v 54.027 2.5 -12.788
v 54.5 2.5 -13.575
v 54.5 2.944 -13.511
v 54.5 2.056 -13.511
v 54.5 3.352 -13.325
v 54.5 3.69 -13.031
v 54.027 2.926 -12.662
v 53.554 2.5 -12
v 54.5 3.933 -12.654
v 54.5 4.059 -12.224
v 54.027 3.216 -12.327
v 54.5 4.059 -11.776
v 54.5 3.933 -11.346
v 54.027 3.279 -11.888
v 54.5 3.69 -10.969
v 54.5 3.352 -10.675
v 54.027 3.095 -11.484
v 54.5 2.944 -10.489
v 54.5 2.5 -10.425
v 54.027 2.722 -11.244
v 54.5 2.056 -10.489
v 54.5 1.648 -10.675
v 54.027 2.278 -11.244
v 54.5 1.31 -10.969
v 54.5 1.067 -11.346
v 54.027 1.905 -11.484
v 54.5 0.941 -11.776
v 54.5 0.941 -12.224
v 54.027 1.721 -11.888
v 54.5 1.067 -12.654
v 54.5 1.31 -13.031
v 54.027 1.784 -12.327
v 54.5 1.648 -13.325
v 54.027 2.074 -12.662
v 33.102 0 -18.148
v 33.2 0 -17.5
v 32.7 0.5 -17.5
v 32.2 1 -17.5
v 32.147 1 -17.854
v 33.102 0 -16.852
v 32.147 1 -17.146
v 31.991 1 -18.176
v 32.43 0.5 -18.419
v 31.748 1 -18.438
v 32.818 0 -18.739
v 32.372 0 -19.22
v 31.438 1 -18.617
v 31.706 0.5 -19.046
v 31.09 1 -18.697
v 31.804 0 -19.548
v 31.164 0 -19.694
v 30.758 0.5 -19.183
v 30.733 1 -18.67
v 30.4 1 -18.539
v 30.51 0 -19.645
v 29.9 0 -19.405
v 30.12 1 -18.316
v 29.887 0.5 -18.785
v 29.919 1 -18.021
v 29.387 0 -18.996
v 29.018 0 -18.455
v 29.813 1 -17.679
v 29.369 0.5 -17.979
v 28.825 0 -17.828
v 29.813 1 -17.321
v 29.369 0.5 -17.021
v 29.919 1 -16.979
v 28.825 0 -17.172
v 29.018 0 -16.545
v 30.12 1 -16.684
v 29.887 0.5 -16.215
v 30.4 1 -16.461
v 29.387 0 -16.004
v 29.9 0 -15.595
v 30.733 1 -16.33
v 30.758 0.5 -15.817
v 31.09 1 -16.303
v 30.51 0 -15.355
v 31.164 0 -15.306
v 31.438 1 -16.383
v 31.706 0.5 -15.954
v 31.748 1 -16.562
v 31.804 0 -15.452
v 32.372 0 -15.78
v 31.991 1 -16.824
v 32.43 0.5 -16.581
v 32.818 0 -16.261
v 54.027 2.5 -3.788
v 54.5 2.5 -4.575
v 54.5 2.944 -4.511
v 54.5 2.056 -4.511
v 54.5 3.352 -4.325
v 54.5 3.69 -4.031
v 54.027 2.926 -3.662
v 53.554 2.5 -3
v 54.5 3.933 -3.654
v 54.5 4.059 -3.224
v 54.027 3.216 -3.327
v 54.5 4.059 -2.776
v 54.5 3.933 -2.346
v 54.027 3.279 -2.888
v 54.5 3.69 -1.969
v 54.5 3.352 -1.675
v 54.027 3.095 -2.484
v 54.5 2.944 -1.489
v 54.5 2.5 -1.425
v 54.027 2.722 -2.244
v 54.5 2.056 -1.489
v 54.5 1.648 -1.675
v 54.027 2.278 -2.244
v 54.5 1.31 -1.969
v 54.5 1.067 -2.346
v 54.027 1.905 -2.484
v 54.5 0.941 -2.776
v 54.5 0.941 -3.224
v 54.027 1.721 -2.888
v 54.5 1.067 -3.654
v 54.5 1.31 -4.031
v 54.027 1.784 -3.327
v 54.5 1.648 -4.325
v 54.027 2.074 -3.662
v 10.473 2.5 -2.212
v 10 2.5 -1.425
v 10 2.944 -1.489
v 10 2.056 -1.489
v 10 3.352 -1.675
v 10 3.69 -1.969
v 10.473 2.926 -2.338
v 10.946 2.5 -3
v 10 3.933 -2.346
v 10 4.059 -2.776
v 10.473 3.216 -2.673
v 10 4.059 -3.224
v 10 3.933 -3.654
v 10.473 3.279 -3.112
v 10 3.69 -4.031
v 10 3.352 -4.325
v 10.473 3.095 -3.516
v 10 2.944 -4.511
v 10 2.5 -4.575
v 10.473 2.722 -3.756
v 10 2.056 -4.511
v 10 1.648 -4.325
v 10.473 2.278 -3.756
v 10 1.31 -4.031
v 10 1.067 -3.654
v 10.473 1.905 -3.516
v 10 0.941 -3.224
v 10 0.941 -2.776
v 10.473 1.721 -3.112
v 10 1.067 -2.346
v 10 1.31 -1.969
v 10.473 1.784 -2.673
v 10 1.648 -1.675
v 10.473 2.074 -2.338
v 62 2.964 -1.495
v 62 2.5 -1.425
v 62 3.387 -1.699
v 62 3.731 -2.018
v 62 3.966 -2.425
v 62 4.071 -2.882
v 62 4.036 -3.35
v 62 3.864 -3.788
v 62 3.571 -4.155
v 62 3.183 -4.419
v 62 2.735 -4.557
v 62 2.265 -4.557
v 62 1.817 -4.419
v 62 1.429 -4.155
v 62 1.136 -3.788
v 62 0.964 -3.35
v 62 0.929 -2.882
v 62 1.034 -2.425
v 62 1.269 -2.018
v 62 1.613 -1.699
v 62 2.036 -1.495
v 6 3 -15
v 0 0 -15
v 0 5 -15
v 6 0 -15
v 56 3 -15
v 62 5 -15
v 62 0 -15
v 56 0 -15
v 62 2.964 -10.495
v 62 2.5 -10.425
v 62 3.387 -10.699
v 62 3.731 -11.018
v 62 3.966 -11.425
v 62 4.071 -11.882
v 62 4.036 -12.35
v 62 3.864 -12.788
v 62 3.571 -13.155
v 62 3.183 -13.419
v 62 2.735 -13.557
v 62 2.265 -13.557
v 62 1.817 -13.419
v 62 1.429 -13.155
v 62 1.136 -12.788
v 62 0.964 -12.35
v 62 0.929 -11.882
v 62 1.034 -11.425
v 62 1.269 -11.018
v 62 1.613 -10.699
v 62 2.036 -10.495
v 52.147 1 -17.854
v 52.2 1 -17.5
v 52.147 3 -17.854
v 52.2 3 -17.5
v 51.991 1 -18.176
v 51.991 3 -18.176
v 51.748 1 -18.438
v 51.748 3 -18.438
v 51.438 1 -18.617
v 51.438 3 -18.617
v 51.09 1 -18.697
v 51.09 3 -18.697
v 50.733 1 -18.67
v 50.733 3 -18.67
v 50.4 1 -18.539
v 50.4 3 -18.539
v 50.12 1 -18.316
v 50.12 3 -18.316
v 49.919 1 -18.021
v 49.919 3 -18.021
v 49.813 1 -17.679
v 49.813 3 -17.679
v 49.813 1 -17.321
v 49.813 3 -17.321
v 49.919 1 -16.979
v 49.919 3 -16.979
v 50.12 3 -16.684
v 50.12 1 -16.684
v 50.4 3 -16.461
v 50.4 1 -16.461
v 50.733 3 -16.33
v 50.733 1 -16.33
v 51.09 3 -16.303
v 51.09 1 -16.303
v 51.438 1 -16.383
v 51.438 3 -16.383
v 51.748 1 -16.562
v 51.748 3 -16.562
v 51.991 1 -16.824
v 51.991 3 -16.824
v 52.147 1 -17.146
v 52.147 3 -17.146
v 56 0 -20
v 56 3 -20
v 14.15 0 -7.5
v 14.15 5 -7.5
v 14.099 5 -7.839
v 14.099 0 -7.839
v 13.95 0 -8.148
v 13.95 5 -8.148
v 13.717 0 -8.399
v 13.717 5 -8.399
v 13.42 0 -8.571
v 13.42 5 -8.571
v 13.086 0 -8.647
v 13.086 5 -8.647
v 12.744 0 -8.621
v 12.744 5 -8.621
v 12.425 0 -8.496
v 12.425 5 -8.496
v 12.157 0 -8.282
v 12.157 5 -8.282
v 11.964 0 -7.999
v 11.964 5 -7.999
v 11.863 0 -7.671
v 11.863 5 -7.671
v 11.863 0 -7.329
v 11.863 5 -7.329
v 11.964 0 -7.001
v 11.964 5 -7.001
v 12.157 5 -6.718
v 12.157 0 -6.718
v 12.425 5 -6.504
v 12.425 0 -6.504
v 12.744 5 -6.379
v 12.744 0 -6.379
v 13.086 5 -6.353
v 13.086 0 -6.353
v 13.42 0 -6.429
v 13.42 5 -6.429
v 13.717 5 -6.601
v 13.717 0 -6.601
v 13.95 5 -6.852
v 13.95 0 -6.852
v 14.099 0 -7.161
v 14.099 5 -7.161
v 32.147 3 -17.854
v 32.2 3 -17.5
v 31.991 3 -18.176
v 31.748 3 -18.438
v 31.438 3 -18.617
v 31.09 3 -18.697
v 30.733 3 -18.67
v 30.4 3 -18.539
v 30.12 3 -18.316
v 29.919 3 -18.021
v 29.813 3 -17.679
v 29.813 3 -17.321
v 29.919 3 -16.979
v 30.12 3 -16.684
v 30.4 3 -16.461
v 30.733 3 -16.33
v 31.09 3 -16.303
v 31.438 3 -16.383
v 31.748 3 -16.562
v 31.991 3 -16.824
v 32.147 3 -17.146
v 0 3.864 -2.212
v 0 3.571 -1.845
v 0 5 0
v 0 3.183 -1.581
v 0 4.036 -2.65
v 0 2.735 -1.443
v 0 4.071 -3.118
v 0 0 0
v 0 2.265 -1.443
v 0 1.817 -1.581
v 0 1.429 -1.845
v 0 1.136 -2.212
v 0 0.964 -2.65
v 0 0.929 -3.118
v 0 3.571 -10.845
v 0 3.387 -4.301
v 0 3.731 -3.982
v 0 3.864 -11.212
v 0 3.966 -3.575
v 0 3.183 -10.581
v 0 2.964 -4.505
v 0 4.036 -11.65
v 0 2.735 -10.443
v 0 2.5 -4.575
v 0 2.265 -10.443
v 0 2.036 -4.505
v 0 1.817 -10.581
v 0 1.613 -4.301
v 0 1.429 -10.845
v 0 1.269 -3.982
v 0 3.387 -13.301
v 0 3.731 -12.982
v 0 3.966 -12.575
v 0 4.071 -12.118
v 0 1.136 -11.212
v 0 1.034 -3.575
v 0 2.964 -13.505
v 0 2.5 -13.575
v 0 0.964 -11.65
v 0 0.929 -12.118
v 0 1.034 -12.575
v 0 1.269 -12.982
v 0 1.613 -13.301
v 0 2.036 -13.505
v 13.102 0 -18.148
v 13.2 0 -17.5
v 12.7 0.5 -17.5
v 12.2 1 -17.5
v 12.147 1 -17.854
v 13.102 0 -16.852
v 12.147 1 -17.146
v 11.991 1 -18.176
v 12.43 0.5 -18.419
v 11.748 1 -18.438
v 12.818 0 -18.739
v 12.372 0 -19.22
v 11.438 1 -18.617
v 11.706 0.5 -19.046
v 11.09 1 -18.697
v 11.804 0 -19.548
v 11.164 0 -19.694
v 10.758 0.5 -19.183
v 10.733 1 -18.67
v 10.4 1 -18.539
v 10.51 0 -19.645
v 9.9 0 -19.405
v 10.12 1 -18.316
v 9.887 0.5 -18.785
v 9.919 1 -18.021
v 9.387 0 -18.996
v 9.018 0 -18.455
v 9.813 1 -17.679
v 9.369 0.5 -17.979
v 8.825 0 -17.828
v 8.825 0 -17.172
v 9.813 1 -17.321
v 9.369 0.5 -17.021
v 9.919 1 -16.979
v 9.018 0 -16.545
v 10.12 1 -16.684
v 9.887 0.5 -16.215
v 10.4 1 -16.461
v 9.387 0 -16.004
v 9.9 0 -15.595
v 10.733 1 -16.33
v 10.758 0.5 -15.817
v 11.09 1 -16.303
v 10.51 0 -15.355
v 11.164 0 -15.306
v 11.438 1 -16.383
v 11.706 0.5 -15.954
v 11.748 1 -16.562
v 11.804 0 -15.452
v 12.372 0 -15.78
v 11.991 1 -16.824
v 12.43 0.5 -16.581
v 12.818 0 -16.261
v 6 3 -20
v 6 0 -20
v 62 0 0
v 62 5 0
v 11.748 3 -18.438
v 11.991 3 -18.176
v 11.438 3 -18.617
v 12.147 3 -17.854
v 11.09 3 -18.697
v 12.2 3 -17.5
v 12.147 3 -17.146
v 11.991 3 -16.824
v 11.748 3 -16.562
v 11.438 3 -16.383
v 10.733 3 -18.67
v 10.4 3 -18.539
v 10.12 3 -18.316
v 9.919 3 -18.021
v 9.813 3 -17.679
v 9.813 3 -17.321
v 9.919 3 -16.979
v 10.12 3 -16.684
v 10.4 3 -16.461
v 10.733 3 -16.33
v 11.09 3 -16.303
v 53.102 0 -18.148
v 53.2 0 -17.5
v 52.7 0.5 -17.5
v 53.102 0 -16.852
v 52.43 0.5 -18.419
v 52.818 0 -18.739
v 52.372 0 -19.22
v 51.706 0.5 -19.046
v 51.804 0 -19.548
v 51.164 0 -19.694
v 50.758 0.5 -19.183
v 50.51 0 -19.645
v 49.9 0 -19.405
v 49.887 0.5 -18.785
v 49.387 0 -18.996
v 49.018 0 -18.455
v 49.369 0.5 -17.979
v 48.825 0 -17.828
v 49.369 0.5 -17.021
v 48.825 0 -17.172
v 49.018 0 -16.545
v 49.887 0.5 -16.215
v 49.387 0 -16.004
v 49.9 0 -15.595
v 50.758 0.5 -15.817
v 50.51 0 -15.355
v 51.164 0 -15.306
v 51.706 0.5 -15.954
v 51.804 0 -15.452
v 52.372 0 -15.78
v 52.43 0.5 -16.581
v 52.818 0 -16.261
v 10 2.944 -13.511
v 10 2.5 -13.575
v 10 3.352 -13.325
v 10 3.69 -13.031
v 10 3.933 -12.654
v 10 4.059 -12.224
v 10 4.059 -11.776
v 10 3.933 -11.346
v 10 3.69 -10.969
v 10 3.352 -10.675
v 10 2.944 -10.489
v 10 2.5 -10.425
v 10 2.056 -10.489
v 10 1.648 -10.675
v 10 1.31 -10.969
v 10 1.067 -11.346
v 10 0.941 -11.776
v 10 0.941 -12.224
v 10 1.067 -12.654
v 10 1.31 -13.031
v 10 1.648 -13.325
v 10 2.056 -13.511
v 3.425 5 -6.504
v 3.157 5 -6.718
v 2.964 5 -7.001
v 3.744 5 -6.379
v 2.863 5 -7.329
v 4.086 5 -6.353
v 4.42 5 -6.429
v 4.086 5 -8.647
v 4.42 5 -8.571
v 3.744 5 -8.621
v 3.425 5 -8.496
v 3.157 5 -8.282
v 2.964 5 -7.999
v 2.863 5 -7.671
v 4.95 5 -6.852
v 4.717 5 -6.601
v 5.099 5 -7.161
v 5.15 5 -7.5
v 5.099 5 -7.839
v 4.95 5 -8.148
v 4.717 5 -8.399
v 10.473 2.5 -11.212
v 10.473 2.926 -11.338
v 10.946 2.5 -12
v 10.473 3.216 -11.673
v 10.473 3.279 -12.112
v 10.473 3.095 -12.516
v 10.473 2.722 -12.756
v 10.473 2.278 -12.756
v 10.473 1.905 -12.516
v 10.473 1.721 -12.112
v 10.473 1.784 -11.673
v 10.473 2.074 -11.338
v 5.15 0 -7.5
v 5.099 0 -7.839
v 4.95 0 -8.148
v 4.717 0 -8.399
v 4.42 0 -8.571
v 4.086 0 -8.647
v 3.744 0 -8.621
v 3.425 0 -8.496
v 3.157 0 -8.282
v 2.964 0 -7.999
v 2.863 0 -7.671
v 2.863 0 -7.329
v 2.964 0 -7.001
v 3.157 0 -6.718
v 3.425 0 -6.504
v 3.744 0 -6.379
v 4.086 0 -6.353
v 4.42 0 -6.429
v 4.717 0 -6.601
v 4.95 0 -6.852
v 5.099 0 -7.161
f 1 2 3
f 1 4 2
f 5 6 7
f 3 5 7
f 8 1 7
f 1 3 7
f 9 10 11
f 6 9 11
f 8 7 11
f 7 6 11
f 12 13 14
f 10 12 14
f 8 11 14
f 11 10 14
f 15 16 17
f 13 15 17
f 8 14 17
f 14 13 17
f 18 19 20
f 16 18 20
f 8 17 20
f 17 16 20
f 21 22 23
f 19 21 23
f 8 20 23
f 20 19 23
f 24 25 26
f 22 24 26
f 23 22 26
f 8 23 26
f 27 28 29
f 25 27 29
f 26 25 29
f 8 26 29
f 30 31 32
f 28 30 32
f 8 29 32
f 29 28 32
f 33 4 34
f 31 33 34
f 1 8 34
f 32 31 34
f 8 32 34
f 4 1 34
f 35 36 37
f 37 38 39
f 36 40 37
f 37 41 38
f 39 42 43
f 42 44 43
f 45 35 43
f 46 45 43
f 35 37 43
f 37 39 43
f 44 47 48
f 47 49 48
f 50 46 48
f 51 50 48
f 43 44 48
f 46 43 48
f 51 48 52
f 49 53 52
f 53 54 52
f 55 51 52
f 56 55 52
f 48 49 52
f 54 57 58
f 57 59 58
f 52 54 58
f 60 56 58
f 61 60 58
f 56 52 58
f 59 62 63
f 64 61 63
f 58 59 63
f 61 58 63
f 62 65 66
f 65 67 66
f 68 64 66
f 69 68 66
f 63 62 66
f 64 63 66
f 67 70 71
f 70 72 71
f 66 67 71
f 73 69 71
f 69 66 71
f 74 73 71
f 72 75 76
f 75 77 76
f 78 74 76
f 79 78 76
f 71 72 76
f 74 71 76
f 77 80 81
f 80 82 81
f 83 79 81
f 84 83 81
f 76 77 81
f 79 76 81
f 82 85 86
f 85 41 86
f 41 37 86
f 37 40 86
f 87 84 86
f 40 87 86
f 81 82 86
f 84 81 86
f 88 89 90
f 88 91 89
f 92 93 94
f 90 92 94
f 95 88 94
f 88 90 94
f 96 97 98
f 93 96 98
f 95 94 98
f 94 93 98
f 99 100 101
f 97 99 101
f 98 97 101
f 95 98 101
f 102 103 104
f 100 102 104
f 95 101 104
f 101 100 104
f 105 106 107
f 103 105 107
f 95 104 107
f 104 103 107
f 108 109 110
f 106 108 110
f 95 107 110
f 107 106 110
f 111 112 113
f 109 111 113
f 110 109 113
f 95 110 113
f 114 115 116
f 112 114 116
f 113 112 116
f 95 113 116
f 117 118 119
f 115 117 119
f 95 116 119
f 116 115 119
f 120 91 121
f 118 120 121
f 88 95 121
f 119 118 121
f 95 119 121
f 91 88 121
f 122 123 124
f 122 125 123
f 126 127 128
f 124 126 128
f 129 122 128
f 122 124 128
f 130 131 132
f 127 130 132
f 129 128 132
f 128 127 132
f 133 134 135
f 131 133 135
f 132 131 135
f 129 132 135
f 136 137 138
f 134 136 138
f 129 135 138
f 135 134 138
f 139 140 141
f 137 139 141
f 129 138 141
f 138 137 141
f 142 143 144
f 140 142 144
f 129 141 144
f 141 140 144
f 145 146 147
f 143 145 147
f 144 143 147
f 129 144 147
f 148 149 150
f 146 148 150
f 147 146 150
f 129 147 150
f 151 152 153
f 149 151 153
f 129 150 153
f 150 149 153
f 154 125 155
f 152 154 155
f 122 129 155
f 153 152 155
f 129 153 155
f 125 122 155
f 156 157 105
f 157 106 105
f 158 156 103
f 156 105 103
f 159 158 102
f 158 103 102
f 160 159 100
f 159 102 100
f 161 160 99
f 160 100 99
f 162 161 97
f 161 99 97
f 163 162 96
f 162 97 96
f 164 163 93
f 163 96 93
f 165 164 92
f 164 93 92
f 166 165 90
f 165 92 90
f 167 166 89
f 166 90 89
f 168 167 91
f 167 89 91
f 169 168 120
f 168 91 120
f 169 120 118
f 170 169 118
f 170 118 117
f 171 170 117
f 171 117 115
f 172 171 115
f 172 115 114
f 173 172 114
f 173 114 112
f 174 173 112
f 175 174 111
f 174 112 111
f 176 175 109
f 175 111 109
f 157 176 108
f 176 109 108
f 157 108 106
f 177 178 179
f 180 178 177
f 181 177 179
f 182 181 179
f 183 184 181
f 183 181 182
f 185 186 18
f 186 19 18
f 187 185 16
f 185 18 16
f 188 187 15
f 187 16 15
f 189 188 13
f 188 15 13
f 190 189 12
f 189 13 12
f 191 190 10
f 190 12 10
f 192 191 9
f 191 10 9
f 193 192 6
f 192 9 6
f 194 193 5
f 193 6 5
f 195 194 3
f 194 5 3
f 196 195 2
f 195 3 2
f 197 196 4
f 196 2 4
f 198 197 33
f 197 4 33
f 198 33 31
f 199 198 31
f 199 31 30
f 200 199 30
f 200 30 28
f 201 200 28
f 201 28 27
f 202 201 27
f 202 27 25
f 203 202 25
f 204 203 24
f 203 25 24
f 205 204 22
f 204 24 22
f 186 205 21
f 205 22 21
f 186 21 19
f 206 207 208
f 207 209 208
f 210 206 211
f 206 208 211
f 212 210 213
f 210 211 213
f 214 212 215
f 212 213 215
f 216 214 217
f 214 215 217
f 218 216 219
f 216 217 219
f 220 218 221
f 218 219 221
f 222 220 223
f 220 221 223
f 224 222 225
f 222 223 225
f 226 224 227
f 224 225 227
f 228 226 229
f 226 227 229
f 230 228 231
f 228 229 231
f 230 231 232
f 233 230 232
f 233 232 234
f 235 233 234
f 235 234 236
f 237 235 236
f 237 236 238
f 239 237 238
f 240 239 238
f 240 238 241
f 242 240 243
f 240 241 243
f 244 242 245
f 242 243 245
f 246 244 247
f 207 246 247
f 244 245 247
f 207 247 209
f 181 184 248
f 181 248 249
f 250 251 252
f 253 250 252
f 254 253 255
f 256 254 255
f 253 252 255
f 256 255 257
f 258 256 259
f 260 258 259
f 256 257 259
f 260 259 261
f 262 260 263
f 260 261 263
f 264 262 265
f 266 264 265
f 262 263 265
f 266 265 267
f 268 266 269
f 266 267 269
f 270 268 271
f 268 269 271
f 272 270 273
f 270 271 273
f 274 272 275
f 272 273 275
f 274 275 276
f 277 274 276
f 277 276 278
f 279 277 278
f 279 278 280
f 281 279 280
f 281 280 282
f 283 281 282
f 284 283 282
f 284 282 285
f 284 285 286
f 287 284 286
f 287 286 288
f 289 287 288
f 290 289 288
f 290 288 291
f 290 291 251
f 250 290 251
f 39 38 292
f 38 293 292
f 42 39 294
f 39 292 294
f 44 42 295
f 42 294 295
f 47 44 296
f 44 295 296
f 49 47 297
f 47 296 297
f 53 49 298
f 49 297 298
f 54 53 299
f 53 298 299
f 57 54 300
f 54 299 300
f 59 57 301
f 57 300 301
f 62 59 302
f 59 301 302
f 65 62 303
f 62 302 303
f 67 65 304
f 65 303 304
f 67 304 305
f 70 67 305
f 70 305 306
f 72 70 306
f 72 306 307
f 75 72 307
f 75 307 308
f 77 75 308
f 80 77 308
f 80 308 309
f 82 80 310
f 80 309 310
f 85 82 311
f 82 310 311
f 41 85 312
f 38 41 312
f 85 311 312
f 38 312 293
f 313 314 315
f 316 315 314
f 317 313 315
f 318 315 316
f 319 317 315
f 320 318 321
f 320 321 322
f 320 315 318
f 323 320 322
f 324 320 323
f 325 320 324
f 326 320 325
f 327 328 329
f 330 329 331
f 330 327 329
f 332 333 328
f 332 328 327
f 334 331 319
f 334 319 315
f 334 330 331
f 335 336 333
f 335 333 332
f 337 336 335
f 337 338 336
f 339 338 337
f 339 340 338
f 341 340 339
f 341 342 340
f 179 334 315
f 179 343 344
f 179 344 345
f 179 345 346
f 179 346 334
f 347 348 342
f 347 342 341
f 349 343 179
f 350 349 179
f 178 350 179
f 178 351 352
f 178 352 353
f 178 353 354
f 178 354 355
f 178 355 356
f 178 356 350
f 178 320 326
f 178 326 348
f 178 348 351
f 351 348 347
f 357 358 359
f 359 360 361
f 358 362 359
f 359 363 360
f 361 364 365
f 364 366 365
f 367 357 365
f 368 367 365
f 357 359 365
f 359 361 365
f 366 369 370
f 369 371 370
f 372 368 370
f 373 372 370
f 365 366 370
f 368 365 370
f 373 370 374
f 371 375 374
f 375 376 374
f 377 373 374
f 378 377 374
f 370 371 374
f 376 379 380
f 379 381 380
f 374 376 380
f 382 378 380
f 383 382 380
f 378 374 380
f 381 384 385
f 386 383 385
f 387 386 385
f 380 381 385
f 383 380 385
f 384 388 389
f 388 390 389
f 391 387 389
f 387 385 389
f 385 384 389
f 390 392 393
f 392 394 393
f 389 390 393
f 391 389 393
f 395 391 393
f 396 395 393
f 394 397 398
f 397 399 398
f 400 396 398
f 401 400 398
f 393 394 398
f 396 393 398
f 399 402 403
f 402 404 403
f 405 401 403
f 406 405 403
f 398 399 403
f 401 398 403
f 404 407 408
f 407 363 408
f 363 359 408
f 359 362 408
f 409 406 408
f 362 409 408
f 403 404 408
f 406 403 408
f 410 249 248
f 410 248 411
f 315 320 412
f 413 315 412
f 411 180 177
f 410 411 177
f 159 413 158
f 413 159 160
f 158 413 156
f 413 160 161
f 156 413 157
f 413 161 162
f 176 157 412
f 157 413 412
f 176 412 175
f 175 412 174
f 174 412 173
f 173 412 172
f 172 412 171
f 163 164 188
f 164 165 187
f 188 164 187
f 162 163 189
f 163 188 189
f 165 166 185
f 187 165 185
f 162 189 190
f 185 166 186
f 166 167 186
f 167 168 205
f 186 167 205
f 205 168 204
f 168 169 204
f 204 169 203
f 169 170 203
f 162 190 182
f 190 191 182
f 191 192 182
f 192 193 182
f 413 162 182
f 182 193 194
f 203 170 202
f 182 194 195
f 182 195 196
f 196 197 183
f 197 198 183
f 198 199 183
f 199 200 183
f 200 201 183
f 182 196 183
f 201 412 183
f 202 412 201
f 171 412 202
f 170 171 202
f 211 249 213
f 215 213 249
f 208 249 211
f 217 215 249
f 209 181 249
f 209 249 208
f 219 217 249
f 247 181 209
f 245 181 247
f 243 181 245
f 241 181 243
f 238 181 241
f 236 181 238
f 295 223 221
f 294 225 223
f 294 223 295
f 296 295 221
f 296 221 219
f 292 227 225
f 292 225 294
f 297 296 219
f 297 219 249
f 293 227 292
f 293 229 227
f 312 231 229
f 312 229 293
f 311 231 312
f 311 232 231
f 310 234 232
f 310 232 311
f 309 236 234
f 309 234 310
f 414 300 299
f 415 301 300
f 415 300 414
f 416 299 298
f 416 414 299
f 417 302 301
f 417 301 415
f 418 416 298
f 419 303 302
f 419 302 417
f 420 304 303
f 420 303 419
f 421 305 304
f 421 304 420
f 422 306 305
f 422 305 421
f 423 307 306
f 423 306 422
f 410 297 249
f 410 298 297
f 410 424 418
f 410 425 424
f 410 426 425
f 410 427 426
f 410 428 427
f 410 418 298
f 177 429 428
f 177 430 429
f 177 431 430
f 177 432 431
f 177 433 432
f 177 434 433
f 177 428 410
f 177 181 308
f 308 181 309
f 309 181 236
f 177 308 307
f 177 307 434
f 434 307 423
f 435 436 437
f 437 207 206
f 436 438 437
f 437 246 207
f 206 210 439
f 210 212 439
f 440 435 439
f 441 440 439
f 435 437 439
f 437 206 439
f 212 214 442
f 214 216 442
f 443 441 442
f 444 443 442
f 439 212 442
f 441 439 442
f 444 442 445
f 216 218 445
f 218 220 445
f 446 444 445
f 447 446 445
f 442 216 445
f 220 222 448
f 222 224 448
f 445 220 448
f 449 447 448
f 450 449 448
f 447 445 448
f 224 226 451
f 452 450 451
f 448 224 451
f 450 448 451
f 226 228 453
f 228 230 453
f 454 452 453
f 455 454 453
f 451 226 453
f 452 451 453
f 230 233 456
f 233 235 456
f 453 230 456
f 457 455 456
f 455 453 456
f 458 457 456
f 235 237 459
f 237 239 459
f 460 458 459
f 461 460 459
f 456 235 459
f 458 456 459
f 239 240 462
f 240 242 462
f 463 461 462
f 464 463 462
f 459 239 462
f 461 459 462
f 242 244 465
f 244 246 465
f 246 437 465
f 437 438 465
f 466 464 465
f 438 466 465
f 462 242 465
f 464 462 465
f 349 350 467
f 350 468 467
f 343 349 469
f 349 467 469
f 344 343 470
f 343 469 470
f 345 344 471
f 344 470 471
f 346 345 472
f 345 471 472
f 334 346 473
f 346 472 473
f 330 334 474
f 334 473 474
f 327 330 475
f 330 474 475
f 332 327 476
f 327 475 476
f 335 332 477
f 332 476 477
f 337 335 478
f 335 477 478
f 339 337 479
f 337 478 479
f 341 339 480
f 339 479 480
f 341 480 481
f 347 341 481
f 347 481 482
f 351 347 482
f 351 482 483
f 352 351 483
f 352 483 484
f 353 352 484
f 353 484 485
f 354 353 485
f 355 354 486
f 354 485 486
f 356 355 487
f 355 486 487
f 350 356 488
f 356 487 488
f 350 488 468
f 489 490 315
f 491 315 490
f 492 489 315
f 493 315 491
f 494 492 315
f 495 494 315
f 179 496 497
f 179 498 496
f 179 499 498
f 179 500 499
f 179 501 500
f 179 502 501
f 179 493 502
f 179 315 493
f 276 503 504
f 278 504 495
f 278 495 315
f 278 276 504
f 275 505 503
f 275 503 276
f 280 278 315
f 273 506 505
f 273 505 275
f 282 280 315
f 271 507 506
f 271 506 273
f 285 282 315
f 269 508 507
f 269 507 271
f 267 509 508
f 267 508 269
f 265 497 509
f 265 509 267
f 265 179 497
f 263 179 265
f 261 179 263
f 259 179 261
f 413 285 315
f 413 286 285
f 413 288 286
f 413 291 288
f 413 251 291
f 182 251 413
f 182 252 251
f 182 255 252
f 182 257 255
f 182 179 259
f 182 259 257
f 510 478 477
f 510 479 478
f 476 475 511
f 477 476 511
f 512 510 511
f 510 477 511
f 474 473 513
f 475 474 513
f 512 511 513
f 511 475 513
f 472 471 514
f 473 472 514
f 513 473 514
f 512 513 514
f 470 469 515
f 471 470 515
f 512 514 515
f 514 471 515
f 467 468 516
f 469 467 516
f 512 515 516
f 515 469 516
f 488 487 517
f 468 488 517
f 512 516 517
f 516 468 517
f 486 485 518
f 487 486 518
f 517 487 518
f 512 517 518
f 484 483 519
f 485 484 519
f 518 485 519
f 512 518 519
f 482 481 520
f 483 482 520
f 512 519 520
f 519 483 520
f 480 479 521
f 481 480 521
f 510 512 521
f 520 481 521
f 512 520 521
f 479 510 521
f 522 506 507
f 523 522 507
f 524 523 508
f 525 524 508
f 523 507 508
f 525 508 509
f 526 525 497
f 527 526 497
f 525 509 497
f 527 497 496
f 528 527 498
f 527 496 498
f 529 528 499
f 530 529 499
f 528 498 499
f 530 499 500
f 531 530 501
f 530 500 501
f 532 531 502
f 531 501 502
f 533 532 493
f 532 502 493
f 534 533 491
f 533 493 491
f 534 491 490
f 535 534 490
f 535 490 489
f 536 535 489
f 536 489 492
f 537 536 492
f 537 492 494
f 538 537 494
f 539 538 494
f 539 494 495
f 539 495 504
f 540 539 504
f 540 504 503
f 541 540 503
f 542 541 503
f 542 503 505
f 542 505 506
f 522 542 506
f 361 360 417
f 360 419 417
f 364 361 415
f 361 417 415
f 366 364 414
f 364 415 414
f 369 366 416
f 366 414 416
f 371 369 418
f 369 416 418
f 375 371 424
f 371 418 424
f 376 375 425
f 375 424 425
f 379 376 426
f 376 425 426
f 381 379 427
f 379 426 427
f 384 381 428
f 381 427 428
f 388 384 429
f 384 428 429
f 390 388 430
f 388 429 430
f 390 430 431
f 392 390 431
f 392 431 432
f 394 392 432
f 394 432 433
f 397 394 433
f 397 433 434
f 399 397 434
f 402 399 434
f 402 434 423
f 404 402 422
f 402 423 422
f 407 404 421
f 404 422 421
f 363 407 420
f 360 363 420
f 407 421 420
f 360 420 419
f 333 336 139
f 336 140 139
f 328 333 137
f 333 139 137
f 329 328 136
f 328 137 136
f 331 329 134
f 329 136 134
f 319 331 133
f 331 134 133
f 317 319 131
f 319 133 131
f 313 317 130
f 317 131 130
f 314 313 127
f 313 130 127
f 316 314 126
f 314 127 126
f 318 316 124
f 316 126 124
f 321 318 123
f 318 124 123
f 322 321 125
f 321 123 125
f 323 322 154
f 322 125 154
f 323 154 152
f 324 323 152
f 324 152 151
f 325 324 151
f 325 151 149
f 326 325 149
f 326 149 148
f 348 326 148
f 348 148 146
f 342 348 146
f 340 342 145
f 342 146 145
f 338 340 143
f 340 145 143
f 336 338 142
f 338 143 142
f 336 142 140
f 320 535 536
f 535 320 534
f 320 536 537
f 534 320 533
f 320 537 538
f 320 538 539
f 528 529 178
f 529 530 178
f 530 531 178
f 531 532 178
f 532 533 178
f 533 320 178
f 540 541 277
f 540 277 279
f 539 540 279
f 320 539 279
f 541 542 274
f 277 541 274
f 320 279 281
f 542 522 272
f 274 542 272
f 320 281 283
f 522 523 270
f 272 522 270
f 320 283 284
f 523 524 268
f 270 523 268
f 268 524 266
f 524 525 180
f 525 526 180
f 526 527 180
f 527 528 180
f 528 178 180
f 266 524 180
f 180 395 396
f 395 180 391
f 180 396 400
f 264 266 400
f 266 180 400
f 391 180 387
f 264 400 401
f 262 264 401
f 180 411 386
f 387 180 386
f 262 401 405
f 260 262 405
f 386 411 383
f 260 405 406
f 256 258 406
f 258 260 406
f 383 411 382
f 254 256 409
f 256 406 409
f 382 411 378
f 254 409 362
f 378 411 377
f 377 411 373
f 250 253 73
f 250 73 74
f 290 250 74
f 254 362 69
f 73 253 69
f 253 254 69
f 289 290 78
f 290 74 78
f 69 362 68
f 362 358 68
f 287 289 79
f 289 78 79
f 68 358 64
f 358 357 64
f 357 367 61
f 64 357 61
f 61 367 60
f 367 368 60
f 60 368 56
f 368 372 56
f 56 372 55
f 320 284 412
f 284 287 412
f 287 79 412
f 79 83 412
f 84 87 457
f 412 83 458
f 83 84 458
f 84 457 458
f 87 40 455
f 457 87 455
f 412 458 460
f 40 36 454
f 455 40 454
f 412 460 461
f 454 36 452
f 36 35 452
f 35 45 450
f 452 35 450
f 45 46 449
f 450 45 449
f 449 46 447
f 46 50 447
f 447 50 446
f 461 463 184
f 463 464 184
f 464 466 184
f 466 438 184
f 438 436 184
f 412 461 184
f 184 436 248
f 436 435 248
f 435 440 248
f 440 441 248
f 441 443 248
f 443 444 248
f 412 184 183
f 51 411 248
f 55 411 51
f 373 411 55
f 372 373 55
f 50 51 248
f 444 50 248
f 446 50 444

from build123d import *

# Parameters (mm, degrees)
ESBO_O1_W                                            = 62
ESBO_O1_H                                            = 15
RESSALTO_EXTRUS_O1_DEPTH                             = 5
FURO_ROSCADO_PARA_CONDU_TE_DE_M3X0_51_D              = 3.15
FURO_ROSCADO_PARA_CONDU_TE_DE_M3X0_51_DEPTH          = 10
FURO_ROSCADO_PARA_CONDU_TE_DE_M3X0_51_TIP            = 0.946355475
FURO_ROSCADO_PARA_CONDU_TE_DE_M3X0_52_D              = 3.15
FURO_ROSCADO_PARA_CONDU_TE_DE_M3X0_52_DEPTH          = 7.5
FURO_ROSCADO_PARA_CONDU_TE_DE_M3X0_52_TIP            = 0.946355475
FURO_ROSCADO_PARA_CONDU_TE_DE_M2_2X0_451_D           = 2.3
ESBO_O12_W                                           = 50
ESBO_O12_H                                           = 3
RESSALTO_EXTRUS_O2_DEPTH                             = 5
ESCAREADO_PARA_PARAFUSO_DE_M_QUINA_COM_C_D           = 2.4
ESCAREADO_PARA_PARAFUSO_DE_M_QUINA_COM_C_CSINK_D     = 4.4
ESCAREADO_PARA_PARAFUSO_DE_M_QUINA_COM_C_CSINK_ANGLE = 90


with BuildPart() as part:
    # Esboço1 → Ressalto-extrusão1 (new body)
    with BuildSketch(Plane(origin=(0, 0, 0), x_dir=(1, 0, 0), z_dir=(0, 1, 0))):
        with Locations((31, 7.5)):
            Rectangle(ESBO_O1_W, ESBO_O1_H)
    extrude(amount=RESSALTO_EXTRUS_O1_DEPTH)

    # Furo roscado para conduíte de M3x0.51
    with Locations(Plane.ZY):
        with Locations((-12, 2.5), (-3, 2.5)):
            Hole(FURO_ROSCADO_PARA_CONDU_TE_DE_M3X0_51_D / 2, depth=FURO_ROSCADO_PARA_CONDU_TE_DE_M3X0_51_DEPTH)
            with Locations((0, 0, -(FURO_ROSCADO_PARA_CONDU_TE_DE_M3X0_51_DEPTH + FURO_ROSCADO_PARA_CONDU_TE_DE_M3X0_51_TIP / 2))):  # 118° drill point
                Cone(0, FURO_ROSCADO_PARA_CONDU_TE_DE_M3X0_51_D / 2, FURO_ROSCADO_PARA_CONDU_TE_DE_M3X0_51_TIP, mode=Mode.SUBTRACT)

    # Furo roscado para conduíte de M3x0.52
    with Locations(Plane(origin=(62, 0, 0), x_dir=(0, 0, -1), z_dir=(1, 0, 0))):
        with Locations((3, 2.5), (12, 2.5)):
            Hole(FURO_ROSCADO_PARA_CONDU_TE_DE_M3X0_52_D / 2, depth=FURO_ROSCADO_PARA_CONDU_TE_DE_M3X0_52_DEPTH)
            with Locations((0, 0, -(FURO_ROSCADO_PARA_CONDU_TE_DE_M3X0_52_DEPTH + FURO_ROSCADO_PARA_CONDU_TE_DE_M3X0_52_TIP / 2))):  # 118° drill point
                Cone(0, FURO_ROSCADO_PARA_CONDU_TE_DE_M3X0_52_D / 2, FURO_ROSCADO_PARA_CONDU_TE_DE_M3X0_52_TIP, mode=Mode.SUBTRACT)

    # Furo roscado para conduíte de M2.2x0.451 (through all)
    with Locations(Plane(origin=(0, 0, 0), x_dir=(-1, 0, 0), z_dir=(0, -1, 0))):
        with Locations((-4, 7.5), (-13, 7.5)):
            Hole(FURO_ROSCADO_PARA_CONDU_TE_DE_M2_2X0_451_D / 2)

    # Esboço12 → Ressalto-extrusão2 (add)
    with BuildSketch(Plane(origin=(0, 0, -15), x_dir=(-1, 0, 0), z_dir=(0, 0, -1))):
        with Locations((-31, 1.5)):
            Rectangle(ESBO_O12_W, ESBO_O12_H)
    extrude(amount=RESSALTO_EXTRUS_O2_DEPTH)

    # Escareado para parafuso de máquina com cabeça chata de M21 (through all)
    with Locations(Plane(origin=(0, 0, 0), x_dir=(-1, 0, 0), z_dir=(0, -1, 0))):
        with Locations((-11, 17.5), (-51, 17.5), (-31, 17.5)):
            CounterSinkHole(ESCAREADO_PARA_PARAFUSO_DE_M_QUINA_COM_C_D / 2, ESCAREADO_PARA_PARAFUSO_DE_M_QUINA_COM_C_CSINK_D / 2, counter_sink_angle=ESCAREADO_PARA_PARAFUSO_DE_M_QUINA_COM_C_CSINK_ANGLE)


solid = part.part
